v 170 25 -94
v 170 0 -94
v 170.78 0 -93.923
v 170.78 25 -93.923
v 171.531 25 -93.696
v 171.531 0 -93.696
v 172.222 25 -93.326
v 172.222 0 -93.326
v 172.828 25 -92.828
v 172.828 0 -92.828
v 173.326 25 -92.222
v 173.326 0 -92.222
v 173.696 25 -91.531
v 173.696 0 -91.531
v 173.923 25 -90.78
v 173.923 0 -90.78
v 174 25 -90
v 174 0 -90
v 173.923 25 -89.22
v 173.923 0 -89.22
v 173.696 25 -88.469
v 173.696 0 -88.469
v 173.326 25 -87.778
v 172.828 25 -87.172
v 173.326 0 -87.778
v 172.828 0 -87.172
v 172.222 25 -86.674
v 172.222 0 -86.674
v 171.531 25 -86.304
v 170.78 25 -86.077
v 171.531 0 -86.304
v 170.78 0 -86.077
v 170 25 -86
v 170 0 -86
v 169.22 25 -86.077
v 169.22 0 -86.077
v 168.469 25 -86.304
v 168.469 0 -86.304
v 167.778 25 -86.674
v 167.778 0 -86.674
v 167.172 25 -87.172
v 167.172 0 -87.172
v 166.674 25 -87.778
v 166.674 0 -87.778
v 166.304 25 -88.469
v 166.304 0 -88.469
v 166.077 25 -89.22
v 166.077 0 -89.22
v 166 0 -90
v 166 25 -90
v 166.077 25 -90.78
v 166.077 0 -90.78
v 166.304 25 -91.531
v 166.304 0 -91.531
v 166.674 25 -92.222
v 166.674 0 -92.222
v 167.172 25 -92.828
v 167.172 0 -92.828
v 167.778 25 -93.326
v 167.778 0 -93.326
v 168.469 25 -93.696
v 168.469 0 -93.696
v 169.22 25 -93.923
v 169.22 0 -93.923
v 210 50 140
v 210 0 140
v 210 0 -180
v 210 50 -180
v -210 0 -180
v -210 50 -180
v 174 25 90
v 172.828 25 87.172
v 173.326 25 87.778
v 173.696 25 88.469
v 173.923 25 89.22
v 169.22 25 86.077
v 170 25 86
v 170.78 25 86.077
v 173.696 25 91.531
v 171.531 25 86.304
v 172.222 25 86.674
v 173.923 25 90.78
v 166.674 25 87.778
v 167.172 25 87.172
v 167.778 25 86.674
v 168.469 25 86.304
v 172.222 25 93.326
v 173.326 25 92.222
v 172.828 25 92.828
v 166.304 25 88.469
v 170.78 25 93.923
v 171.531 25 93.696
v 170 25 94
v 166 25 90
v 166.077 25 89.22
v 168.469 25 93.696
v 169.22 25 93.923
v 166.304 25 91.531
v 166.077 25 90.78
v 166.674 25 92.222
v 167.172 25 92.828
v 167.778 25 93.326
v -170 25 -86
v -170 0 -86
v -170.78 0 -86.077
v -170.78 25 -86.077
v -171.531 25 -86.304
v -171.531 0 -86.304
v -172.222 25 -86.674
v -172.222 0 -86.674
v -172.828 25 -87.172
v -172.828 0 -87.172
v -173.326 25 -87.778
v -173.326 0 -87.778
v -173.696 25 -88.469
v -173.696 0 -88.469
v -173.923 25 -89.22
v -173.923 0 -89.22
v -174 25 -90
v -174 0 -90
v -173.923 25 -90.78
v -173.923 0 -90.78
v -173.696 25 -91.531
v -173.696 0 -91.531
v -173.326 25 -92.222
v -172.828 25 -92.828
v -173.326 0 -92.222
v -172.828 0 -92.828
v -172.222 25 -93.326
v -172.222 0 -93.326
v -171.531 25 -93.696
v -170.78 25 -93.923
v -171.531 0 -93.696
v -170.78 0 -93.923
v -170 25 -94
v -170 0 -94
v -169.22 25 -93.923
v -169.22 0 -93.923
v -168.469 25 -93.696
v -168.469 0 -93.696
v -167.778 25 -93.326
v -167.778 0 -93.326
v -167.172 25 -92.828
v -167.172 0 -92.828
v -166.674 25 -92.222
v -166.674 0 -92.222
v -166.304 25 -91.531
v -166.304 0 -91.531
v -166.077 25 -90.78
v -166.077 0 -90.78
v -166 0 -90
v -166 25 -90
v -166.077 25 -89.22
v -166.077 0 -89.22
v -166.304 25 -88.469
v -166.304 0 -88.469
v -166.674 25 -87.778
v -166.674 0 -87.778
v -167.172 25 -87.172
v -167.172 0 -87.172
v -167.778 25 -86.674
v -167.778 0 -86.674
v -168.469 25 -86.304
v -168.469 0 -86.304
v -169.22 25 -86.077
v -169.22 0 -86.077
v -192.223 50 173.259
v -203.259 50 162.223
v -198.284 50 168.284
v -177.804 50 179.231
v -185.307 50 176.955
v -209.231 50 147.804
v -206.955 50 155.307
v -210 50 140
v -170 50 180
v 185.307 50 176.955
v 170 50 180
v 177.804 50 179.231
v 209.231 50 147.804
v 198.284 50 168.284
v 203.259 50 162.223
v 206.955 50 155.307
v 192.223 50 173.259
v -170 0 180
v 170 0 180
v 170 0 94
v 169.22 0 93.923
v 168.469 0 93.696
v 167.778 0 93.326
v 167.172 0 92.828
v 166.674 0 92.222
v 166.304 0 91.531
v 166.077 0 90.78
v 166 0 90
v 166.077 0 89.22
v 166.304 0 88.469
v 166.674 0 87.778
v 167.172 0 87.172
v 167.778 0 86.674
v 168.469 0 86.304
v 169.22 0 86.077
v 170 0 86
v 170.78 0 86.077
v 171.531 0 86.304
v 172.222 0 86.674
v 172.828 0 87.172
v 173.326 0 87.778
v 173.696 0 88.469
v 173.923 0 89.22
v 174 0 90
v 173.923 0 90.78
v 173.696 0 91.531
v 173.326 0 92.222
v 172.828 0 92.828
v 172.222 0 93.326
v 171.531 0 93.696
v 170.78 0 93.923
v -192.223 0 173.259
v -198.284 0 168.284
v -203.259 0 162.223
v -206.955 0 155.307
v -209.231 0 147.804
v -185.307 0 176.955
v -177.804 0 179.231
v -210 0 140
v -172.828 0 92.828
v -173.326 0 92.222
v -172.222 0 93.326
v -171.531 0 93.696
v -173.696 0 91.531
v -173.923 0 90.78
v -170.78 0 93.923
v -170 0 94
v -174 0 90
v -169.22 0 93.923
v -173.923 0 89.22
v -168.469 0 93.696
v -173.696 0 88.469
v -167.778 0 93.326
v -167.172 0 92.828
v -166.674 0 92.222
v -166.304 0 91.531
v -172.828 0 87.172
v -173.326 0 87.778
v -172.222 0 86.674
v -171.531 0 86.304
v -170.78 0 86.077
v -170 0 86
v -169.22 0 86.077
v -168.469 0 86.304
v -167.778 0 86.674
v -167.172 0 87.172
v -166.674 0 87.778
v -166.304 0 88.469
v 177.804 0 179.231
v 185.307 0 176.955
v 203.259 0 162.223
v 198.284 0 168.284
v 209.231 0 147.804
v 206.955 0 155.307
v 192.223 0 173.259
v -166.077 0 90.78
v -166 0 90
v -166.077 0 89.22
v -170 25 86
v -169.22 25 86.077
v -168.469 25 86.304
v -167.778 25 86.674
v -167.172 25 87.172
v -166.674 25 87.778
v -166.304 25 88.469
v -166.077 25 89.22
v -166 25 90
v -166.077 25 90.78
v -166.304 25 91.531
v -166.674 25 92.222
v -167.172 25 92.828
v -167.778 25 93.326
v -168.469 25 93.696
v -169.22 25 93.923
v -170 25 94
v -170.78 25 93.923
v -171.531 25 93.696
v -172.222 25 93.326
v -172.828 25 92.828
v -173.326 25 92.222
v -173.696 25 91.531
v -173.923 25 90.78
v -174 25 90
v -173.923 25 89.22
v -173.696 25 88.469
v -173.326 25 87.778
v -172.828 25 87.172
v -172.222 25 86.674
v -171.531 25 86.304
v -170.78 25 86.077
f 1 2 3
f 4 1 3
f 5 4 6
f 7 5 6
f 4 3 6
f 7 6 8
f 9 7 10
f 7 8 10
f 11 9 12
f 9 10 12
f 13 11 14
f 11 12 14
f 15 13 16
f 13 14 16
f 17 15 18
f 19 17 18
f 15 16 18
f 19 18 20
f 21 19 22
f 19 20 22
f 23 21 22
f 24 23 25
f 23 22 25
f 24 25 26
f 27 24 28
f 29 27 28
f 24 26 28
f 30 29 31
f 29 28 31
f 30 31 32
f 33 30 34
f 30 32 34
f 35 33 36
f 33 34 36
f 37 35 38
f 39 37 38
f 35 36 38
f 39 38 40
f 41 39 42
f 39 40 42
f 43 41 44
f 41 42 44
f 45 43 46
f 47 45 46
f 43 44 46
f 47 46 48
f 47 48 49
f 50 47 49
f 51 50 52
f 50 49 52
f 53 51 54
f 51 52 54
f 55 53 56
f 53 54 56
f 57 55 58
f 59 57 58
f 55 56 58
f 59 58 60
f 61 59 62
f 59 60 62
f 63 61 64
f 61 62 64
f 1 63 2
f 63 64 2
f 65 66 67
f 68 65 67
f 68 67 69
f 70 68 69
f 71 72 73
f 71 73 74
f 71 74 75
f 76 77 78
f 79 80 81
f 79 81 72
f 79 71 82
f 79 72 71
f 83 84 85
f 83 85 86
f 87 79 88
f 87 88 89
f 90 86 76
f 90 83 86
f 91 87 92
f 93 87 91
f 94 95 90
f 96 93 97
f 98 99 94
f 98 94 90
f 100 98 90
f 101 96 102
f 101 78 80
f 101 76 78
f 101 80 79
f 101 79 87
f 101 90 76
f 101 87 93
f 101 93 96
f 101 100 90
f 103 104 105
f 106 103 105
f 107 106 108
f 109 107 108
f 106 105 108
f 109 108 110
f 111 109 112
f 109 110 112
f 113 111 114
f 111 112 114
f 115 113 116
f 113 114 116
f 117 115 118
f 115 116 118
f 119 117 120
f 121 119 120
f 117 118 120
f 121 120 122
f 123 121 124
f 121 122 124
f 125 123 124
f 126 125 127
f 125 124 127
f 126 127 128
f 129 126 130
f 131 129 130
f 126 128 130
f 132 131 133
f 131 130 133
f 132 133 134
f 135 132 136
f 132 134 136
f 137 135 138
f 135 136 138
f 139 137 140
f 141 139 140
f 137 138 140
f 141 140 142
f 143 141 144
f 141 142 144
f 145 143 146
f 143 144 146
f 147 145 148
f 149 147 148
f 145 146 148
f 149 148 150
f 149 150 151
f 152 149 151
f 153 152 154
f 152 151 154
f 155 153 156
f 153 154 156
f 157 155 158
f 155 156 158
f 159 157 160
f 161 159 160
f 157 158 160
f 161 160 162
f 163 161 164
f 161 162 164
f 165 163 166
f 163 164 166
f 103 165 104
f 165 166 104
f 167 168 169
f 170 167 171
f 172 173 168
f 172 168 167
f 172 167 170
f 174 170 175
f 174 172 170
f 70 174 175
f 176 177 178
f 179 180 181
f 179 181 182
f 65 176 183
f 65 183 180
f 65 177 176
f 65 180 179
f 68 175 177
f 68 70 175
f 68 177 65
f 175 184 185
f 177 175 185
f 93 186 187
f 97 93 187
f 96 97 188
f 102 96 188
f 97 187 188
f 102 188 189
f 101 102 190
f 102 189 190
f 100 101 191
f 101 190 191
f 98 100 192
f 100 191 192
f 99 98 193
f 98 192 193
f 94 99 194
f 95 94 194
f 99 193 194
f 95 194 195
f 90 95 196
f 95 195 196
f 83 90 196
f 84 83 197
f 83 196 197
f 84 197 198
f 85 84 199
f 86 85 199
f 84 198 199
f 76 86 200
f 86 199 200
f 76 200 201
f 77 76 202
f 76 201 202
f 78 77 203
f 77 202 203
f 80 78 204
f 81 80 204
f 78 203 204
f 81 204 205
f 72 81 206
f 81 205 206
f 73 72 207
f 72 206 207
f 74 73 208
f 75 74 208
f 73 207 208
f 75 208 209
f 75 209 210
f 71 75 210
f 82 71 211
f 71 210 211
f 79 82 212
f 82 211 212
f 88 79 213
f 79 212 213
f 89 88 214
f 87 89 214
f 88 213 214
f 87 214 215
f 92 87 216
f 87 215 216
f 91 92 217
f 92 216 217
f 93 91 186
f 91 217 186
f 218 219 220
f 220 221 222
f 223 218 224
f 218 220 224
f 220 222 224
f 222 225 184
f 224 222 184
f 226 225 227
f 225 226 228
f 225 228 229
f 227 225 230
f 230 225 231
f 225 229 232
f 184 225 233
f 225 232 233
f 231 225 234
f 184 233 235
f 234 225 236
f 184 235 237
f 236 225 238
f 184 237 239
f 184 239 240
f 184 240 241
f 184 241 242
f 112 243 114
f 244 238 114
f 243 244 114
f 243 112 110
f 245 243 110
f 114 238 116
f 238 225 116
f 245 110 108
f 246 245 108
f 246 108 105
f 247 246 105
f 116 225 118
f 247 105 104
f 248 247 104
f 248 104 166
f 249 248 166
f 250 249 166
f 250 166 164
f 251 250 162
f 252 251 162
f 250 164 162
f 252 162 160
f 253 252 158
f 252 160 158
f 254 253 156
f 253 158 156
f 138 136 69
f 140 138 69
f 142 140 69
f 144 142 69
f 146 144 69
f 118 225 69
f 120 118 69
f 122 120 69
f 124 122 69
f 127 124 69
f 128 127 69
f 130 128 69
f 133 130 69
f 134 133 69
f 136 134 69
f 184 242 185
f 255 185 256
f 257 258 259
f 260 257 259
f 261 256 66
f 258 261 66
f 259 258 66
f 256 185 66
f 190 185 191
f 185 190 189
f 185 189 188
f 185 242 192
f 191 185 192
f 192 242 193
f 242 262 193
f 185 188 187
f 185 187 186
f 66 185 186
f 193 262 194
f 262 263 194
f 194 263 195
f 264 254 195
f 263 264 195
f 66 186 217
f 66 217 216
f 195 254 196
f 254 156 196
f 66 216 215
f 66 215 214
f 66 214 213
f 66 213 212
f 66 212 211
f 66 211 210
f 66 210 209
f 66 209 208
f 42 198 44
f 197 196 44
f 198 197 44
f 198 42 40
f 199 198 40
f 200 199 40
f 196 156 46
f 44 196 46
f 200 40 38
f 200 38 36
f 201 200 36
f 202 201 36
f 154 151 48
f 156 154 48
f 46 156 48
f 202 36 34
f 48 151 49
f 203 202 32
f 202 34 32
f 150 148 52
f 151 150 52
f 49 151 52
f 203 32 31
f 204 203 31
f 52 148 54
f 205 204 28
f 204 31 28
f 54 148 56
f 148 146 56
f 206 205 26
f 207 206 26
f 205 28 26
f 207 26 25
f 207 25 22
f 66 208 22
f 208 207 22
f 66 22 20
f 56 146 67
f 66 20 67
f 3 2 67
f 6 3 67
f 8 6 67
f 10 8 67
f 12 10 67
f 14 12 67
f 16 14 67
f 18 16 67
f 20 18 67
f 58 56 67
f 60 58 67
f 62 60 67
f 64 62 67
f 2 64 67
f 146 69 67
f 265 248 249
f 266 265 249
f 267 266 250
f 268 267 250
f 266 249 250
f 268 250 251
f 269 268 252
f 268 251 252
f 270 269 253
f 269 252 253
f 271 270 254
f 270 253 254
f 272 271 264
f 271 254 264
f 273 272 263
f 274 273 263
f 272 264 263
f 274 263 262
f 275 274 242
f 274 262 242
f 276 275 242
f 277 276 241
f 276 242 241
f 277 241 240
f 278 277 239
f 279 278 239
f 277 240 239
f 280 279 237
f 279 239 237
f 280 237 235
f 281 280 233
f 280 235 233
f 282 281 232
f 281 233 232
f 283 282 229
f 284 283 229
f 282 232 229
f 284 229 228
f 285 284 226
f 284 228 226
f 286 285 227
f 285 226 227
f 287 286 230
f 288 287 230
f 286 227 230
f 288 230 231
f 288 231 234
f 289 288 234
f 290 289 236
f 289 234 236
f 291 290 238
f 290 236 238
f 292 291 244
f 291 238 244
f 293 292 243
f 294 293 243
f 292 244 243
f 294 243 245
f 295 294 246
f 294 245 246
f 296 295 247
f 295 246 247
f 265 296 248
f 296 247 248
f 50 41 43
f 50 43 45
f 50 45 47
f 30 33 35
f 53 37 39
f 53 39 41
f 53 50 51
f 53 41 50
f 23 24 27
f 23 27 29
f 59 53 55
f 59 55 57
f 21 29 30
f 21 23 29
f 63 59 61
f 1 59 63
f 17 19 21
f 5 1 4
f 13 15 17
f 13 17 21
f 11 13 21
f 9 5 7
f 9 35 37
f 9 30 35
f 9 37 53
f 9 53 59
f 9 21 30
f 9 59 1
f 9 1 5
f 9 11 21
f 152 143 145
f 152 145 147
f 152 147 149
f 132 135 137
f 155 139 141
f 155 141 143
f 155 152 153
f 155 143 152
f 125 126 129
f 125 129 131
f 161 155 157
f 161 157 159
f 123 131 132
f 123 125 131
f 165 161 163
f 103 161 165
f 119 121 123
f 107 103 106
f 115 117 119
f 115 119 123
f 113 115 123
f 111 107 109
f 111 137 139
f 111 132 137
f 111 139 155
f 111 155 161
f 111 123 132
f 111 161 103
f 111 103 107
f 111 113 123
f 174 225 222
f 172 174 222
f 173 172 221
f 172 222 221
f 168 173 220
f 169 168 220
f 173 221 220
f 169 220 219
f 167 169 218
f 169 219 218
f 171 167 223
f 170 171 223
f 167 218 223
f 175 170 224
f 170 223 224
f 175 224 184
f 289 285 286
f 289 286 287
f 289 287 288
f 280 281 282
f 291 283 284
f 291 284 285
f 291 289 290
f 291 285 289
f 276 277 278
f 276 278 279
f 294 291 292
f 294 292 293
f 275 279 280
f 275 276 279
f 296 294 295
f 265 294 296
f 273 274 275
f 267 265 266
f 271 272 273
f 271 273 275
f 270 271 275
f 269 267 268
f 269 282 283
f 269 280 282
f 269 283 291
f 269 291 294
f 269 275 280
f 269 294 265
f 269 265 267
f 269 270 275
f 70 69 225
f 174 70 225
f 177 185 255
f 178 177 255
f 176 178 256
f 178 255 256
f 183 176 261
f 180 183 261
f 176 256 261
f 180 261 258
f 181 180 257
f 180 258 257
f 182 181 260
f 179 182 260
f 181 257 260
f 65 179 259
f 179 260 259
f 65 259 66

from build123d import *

# Parameters (mm, degrees)
SALIENTE_EXTRUIR1_DEPTH = 50
CROQUIS5_R              = 4
CORTAR_EXTRUIR1_DEPTH   = 25


with BuildPart() as part:
    # Croquis1 → Saliente-Extruir1 (new body)
    with BuildSketch(Plane(origin=(0, 0, 0), x_dir=(1, 0, 0), z_dir=(0, 1, 0))):
        with BuildLine():
            Line((-170, -180), (170, -180))
            ThreePointArc((170, -180), (198.284271247, -168.284271247), (210, -140))
            Line((210, -140), (210, 180))
            Line((210, 180), (-210, 180))
            Line((-210, 180), (-210, -140))
            ThreePointArc((-210, -140), (-198.284271247, -168.284271247), (-170, -180))
        make_face()
    extrude(amount=SALIENTE_EXTRUIR1_DEPTH)

    # Croquis5 → Cortar-Extruir1 (cut)
    with BuildSketch(Plane.XZ):
        with Locations(Location((-170, 90, 0), (0, 0, 270))):
            Circle(CROQUIS5_R)
        with Locations(Location((-170, -90, 0), (0, 0, 90))):
            Circle(CROQUIS5_R)
        with Locations(Location((170, -90, 0), (0, 0, 270))):
            Circle(CROQUIS5_R)
        with Locations(Location((170, 90, 0), (0, 0, 90))):
            Circle(CROQUIS5_R)
    extrude(amount=-CORTAR_EXTRUIR1_DEPTH, mode=Mode.SUBTRACT)


solid = part.part
